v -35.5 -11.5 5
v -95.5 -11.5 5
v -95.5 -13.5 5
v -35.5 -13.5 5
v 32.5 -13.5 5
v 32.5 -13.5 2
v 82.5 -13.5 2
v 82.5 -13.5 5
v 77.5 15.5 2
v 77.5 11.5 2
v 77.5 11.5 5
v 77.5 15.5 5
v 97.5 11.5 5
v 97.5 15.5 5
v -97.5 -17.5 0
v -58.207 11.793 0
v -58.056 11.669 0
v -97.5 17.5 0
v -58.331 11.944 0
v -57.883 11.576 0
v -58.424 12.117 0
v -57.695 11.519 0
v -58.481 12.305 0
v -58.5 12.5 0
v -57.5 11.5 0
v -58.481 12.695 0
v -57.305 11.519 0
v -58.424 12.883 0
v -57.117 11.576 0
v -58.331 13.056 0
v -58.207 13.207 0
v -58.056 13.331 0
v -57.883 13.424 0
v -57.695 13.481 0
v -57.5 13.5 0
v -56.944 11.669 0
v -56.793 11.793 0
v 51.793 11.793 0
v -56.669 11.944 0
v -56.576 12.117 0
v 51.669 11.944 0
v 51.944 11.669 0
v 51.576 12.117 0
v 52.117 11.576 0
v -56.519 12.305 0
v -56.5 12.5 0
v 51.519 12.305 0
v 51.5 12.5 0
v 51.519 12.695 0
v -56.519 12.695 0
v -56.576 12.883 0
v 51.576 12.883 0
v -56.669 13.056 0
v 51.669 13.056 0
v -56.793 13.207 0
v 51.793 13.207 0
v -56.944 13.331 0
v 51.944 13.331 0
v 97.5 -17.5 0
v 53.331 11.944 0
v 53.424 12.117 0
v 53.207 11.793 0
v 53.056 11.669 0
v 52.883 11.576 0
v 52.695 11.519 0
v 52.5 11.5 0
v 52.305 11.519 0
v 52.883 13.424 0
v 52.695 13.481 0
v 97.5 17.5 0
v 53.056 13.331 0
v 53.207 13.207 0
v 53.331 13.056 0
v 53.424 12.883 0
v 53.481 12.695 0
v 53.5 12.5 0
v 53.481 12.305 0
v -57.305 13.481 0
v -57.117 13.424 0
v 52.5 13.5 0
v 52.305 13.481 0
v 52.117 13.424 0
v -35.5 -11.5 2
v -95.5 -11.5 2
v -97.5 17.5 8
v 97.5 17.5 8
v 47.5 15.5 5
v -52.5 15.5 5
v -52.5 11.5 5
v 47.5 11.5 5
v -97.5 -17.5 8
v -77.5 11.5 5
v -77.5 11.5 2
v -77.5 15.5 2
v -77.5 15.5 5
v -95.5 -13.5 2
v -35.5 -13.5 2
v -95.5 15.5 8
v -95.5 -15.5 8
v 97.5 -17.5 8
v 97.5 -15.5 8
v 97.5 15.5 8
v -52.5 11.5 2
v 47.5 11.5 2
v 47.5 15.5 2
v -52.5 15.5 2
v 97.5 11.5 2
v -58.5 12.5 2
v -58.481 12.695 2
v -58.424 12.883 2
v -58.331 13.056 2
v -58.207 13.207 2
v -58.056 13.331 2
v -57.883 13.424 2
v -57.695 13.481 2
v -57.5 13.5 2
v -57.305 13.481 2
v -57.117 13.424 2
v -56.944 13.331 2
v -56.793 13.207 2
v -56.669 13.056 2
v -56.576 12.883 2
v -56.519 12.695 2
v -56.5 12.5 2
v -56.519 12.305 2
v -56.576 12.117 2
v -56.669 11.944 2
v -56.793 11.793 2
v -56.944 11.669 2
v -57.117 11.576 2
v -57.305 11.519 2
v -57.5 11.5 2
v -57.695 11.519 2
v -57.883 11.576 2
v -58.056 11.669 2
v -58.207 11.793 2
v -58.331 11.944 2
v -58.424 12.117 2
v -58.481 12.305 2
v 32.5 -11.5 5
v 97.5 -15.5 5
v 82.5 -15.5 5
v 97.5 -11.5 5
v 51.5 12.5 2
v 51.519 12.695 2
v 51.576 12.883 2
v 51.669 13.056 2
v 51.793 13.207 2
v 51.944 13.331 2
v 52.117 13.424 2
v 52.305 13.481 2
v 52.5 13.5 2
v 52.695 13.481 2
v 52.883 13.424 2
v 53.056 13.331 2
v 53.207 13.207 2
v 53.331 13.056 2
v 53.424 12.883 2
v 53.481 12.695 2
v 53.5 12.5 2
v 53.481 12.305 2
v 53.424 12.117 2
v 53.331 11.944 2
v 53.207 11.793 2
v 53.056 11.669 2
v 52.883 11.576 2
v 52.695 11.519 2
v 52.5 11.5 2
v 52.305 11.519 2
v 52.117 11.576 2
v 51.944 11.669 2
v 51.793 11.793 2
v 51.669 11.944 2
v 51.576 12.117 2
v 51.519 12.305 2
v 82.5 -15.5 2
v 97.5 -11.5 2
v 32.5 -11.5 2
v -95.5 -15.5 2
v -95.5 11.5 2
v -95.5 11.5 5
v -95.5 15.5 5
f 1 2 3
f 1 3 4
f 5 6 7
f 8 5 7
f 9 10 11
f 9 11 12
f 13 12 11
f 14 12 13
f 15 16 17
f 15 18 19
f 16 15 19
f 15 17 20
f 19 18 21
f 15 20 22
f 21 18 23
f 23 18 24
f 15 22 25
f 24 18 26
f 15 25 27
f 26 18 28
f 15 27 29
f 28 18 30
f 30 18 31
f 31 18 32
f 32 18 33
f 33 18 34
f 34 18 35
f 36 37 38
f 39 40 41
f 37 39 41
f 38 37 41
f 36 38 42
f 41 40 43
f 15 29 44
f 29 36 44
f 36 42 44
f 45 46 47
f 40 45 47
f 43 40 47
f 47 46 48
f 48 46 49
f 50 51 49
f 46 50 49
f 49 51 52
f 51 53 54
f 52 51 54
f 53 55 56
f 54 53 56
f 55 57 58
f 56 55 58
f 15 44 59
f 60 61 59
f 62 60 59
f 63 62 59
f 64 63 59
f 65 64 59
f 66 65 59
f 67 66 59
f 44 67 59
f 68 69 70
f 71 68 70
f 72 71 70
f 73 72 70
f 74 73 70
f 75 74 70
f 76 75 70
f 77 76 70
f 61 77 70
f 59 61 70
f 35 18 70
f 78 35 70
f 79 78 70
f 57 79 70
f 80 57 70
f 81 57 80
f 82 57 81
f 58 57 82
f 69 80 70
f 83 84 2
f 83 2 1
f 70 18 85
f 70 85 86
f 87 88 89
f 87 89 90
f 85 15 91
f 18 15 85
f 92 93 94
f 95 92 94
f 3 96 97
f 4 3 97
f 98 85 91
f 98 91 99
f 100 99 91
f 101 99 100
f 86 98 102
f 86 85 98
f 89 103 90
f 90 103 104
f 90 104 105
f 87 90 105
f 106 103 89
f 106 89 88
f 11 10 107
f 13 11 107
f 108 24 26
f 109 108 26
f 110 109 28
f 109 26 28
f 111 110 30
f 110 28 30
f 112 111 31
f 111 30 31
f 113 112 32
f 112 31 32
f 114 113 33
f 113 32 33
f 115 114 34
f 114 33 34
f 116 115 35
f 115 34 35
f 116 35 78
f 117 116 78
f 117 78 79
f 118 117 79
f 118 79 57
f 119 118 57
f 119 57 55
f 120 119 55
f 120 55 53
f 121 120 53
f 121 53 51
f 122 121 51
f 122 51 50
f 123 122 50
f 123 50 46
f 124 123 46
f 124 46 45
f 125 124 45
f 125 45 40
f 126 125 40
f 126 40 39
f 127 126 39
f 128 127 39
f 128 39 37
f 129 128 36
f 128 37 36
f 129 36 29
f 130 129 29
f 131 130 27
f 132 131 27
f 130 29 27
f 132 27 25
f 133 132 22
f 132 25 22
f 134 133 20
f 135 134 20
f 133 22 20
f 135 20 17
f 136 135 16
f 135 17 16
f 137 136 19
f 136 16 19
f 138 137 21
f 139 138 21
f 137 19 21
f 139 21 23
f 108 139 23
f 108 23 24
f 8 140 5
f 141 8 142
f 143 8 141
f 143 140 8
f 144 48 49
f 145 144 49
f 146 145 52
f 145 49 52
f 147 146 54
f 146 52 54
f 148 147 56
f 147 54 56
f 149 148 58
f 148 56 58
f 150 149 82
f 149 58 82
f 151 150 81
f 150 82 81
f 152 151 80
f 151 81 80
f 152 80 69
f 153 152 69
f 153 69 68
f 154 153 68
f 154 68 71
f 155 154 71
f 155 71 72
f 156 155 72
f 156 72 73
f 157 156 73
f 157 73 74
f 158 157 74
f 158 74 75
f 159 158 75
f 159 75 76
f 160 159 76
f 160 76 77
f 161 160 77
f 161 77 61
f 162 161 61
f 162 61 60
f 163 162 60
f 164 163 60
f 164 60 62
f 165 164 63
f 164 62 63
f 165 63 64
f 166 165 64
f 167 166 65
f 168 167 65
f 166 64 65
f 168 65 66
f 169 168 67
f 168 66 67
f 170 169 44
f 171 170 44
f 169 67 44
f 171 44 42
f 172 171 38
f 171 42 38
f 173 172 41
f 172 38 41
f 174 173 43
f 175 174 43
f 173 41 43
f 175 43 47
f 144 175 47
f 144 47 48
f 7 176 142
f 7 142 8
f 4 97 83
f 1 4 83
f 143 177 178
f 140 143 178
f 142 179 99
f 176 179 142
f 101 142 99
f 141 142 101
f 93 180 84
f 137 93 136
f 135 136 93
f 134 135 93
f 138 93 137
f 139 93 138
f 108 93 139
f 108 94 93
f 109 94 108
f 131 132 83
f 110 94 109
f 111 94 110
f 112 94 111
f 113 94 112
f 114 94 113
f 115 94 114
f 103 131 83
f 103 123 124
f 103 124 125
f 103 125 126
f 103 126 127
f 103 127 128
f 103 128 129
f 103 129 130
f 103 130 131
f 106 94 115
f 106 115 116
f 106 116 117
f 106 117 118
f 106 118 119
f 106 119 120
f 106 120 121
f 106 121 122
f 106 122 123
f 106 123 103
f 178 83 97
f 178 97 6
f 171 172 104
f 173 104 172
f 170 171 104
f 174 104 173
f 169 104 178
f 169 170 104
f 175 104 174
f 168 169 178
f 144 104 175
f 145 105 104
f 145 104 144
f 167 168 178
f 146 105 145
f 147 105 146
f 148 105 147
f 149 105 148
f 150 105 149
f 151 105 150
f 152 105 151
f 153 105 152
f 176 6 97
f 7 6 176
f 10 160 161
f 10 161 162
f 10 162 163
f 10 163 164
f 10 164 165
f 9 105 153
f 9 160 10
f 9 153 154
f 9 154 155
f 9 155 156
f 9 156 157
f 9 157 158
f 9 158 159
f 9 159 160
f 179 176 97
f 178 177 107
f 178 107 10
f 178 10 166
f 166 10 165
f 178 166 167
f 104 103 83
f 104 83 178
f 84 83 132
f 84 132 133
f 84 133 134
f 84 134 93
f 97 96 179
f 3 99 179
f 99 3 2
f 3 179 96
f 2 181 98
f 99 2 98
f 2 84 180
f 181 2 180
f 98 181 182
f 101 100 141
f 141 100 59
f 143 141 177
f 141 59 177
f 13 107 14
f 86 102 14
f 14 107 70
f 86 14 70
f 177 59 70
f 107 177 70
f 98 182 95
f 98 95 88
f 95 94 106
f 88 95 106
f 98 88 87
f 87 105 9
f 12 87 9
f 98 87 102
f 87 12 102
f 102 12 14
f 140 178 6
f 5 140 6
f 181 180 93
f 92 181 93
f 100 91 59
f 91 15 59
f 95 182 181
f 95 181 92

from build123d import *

# Parameters (mm, degrees)
F0_W      = 195
F0_H      = 35
F1_DEPTH  = 2
F2_W      = 195
F2_H      = 2
F3_DEPTH  = 6
F4_W      = 18
F4_H      = 4
F5_DEPTH  = 3
F6_W      = 100
F6_H      = 4
F7_DEPTH  = 3
F8_W      = 20
F8_H      = 4
F9_DEPTH  = 3
F10_W     = 2
F10_H     = 31
F11_DEPTH = 6
F12_W     = 15
F12_H     = 2
F13_DEPTH = 3
F14_W     = 60
F14_H     = 2
F15_DEPTH = 3
F17_D     = 2


with BuildPart() as f1:
    # F0 (on Top) → F1 (new body)
    with BuildSketch(Plane.XY):
        Rectangle(F0_W, F0_H)
    extrude(amount=F1_DEPTH)

    # F2 (on face) → F3 (join)
    with BuildSketch(Plane.XY.offset(2)):
        with Locations((0, -16.5)):
            Rectangle(F2_W, F2_H)
        with Locations((0, 16.5)):
            Rectangle(F2_W, F2_H)
    extrude(amount=F3_DEPTH)

    # F4 (on face) → F5 (join)
    with BuildSketch(Plane.XY.offset(2)):
        with Locations((-86.5, 13.5)):
            Rectangle(F4_W, F4_H)
    extrude(amount=F5_DEPTH)

    # F6 (on face) → F7 (join)
    with BuildSketch(Plane.XY.offset(2)):
        with Locations((-2.5, 13.5)):
            Rectangle(F6_W, F6_H)
    extrude(amount=F7_DEPTH)

    # F8 (on face) → F9 (join)
    with BuildSketch(Plane.XY.offset(2)):
        with Locations((87.5, 13.5)):
            Rectangle(F8_W, F8_H)
    extrude(amount=F9_DEPTH)

    # F10 (on face) → F11 (join)
    with BuildSketch(Plane.XY.offset(2)):
        with Locations((-96.5, 0)):
            Rectangle(F10_W, F10_H)
    extrude(amount=F11_DEPTH)

    # F12 (on face) → F13 (join)
    with BuildSketch(Plane.XY.offset(2)):
        with Locations((90, -14.5)):
            Rectangle(F12_W, F12_H)
        Polygon((82.5, -13.5), (97.5, -13.5), (97.5, -11.5), (32.5, -11.5), (32.5, -13.5), align=None)
    extrude(amount=F13_DEPTH)

    # F14 (on face) → F15 (join)
    with BuildSketch(Plane.XY.offset(2)):
        with Locations((-65.5, -12.5)):
            Rectangle(F14_W, F14_H)
    extrude(amount=F15_DEPTH)

    # F17 (through all)
    with Locations(Plane.XY.offset(2)):
        with Locations((-57.5, 12.5), (52.5, 12.5)):
            Hole(F17_D / 2)


solid = f1.part
